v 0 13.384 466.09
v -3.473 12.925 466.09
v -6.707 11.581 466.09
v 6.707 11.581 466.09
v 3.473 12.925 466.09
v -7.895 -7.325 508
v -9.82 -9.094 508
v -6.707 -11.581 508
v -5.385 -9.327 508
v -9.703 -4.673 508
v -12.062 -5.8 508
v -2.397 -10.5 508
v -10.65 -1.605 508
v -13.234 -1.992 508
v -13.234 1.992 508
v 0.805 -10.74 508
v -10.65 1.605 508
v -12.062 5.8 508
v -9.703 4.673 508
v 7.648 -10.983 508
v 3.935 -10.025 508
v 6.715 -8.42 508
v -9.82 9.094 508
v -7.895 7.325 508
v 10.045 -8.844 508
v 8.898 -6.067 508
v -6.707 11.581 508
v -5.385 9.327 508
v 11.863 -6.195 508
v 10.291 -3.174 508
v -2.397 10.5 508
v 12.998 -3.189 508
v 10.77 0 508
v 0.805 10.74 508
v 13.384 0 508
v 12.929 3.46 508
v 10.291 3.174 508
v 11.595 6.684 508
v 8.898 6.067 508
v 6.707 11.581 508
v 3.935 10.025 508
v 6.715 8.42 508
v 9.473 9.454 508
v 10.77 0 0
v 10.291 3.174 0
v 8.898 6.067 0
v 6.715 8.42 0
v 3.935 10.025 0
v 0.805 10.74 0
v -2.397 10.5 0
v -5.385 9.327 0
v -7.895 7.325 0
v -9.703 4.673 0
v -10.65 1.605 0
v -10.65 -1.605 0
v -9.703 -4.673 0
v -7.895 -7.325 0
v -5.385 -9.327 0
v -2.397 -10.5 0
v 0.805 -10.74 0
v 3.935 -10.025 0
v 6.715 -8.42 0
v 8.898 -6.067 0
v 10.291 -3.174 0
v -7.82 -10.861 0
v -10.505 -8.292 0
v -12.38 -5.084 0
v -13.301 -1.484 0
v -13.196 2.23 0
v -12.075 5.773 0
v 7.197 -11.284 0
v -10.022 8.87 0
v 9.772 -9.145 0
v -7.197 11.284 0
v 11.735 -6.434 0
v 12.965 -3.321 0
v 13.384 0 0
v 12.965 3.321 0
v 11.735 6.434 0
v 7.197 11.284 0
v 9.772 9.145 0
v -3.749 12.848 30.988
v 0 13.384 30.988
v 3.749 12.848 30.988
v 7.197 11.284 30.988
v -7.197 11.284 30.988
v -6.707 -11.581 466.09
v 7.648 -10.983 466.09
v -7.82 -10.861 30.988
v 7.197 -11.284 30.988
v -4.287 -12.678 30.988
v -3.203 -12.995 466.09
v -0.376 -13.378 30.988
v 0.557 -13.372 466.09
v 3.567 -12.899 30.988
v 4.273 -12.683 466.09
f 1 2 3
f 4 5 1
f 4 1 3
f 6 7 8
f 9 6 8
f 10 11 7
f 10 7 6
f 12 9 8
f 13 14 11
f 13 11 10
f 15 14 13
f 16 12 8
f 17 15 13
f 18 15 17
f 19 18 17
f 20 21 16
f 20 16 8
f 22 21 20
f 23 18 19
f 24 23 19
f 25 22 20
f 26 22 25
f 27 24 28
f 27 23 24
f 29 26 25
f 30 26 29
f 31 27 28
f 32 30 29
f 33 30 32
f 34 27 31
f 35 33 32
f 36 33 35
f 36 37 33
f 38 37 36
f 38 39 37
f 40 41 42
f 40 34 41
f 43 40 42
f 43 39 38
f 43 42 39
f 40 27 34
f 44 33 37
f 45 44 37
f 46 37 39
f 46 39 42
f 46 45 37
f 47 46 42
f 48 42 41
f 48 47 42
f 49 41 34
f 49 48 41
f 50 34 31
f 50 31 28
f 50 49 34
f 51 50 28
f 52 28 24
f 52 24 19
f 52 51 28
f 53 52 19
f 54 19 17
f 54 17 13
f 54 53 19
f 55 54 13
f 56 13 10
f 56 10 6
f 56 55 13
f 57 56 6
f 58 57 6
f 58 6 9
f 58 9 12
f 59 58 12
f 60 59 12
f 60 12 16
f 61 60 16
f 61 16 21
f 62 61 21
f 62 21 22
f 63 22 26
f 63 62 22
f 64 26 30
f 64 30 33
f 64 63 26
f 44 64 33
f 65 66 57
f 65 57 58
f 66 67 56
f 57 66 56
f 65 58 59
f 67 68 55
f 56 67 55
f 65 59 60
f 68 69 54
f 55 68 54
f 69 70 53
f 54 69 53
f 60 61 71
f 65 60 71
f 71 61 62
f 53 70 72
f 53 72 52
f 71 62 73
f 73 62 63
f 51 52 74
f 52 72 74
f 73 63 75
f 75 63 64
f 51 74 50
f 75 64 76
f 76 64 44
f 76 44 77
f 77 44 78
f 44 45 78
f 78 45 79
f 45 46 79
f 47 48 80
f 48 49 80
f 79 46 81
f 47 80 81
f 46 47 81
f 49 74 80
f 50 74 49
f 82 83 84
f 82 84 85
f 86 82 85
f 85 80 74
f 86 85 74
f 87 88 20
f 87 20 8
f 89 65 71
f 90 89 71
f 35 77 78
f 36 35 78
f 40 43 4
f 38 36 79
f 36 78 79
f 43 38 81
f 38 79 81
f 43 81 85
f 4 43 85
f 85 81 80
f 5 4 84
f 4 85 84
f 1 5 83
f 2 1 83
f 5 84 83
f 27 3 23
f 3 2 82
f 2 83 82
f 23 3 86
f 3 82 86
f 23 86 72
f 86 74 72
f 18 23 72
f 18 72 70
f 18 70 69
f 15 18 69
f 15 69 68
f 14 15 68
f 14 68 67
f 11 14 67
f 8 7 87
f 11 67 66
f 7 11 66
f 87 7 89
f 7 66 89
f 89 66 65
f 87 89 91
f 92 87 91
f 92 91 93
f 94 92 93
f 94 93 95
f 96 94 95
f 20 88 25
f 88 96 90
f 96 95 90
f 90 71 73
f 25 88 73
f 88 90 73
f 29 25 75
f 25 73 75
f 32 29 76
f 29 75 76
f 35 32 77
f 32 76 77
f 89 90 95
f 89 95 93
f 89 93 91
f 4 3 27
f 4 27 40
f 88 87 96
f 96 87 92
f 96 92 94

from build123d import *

# Parameters (mm, degrees)
SKETCH2_R           = 13.383565171
SKETCH2_R_2         = 10.769869961
BOSS_EXTRUDE1_DEPTH = 508
CUT_EXTRUDE1_START  = -41.91
CUT_EXTRUDE1_DEPTH  = 41.91
CUT_EXTRUDE2_DEPTH  = 30.988


with BuildPart() as part:
    # Sketch2 → Boss-Extrude1 (new body)
    with BuildSketch(Plane.XY):
        Circle(SKETCH2_R)
        Circle(SKETCH2_R_2, mode=Mode.SUBTRACT)
    extrude(amount=BOSS_EXTRUDE1_DEPTH)

    # Sketch3 → Cut-Extrude1 (cut)
    with BuildSketch(Plane.XY.offset(508).offset(CUT_EXTRUDE1_START)):
        with BuildLine():
            ThreePointArc((6.70741417, 11.581468466), (0, 13.383565171), (-6.70741417, 11.581468466))
            Line((-6.70741417, 11.581468466), (6.70741417, 11.581468466))
        make_face()
        with BuildLine():
            Line((7.648089194, -10.983011807), (-6.70741417, -11.581468466))
            ThreePointArc((-6.70741417, -11.581468466), (0.557454006, -13.371950557), (7.648089194, -10.983011807))
        make_face()
    extrude(amount=CUT_EXTRUDE1_DEPTH, mode=Mode.SUBTRACT)

    # Sketch4 → Cut-Extrude2 (cut)
    with BuildSketch(Plane(origin=(0, 0, 0), x_dir=(-1, 0, 0), z_dir=(0, 0, -1))):
        with BuildLine():
            ThreePointArc((7.196946438, 11.28378388), (0, 13.383565171), (-7.196946438, 11.28378388))
            Line((-7.196946438, 11.28378388), (7.196946438, 11.28378388))
        make_face()
        with BuildLine():
            Line((7.820080378, -10.861222747), (-7.196946438, -11.28378388))
            ThreePointArc((-7.196946438, -11.28378388), (0.376448475, -13.378269814), (7.820080378, -10.861222747))
        make_face()
    extrude(amount=-CUT_EXTRUDE2_DEPTH, mode=Mode.SUBTRACT)


solid = part.part
